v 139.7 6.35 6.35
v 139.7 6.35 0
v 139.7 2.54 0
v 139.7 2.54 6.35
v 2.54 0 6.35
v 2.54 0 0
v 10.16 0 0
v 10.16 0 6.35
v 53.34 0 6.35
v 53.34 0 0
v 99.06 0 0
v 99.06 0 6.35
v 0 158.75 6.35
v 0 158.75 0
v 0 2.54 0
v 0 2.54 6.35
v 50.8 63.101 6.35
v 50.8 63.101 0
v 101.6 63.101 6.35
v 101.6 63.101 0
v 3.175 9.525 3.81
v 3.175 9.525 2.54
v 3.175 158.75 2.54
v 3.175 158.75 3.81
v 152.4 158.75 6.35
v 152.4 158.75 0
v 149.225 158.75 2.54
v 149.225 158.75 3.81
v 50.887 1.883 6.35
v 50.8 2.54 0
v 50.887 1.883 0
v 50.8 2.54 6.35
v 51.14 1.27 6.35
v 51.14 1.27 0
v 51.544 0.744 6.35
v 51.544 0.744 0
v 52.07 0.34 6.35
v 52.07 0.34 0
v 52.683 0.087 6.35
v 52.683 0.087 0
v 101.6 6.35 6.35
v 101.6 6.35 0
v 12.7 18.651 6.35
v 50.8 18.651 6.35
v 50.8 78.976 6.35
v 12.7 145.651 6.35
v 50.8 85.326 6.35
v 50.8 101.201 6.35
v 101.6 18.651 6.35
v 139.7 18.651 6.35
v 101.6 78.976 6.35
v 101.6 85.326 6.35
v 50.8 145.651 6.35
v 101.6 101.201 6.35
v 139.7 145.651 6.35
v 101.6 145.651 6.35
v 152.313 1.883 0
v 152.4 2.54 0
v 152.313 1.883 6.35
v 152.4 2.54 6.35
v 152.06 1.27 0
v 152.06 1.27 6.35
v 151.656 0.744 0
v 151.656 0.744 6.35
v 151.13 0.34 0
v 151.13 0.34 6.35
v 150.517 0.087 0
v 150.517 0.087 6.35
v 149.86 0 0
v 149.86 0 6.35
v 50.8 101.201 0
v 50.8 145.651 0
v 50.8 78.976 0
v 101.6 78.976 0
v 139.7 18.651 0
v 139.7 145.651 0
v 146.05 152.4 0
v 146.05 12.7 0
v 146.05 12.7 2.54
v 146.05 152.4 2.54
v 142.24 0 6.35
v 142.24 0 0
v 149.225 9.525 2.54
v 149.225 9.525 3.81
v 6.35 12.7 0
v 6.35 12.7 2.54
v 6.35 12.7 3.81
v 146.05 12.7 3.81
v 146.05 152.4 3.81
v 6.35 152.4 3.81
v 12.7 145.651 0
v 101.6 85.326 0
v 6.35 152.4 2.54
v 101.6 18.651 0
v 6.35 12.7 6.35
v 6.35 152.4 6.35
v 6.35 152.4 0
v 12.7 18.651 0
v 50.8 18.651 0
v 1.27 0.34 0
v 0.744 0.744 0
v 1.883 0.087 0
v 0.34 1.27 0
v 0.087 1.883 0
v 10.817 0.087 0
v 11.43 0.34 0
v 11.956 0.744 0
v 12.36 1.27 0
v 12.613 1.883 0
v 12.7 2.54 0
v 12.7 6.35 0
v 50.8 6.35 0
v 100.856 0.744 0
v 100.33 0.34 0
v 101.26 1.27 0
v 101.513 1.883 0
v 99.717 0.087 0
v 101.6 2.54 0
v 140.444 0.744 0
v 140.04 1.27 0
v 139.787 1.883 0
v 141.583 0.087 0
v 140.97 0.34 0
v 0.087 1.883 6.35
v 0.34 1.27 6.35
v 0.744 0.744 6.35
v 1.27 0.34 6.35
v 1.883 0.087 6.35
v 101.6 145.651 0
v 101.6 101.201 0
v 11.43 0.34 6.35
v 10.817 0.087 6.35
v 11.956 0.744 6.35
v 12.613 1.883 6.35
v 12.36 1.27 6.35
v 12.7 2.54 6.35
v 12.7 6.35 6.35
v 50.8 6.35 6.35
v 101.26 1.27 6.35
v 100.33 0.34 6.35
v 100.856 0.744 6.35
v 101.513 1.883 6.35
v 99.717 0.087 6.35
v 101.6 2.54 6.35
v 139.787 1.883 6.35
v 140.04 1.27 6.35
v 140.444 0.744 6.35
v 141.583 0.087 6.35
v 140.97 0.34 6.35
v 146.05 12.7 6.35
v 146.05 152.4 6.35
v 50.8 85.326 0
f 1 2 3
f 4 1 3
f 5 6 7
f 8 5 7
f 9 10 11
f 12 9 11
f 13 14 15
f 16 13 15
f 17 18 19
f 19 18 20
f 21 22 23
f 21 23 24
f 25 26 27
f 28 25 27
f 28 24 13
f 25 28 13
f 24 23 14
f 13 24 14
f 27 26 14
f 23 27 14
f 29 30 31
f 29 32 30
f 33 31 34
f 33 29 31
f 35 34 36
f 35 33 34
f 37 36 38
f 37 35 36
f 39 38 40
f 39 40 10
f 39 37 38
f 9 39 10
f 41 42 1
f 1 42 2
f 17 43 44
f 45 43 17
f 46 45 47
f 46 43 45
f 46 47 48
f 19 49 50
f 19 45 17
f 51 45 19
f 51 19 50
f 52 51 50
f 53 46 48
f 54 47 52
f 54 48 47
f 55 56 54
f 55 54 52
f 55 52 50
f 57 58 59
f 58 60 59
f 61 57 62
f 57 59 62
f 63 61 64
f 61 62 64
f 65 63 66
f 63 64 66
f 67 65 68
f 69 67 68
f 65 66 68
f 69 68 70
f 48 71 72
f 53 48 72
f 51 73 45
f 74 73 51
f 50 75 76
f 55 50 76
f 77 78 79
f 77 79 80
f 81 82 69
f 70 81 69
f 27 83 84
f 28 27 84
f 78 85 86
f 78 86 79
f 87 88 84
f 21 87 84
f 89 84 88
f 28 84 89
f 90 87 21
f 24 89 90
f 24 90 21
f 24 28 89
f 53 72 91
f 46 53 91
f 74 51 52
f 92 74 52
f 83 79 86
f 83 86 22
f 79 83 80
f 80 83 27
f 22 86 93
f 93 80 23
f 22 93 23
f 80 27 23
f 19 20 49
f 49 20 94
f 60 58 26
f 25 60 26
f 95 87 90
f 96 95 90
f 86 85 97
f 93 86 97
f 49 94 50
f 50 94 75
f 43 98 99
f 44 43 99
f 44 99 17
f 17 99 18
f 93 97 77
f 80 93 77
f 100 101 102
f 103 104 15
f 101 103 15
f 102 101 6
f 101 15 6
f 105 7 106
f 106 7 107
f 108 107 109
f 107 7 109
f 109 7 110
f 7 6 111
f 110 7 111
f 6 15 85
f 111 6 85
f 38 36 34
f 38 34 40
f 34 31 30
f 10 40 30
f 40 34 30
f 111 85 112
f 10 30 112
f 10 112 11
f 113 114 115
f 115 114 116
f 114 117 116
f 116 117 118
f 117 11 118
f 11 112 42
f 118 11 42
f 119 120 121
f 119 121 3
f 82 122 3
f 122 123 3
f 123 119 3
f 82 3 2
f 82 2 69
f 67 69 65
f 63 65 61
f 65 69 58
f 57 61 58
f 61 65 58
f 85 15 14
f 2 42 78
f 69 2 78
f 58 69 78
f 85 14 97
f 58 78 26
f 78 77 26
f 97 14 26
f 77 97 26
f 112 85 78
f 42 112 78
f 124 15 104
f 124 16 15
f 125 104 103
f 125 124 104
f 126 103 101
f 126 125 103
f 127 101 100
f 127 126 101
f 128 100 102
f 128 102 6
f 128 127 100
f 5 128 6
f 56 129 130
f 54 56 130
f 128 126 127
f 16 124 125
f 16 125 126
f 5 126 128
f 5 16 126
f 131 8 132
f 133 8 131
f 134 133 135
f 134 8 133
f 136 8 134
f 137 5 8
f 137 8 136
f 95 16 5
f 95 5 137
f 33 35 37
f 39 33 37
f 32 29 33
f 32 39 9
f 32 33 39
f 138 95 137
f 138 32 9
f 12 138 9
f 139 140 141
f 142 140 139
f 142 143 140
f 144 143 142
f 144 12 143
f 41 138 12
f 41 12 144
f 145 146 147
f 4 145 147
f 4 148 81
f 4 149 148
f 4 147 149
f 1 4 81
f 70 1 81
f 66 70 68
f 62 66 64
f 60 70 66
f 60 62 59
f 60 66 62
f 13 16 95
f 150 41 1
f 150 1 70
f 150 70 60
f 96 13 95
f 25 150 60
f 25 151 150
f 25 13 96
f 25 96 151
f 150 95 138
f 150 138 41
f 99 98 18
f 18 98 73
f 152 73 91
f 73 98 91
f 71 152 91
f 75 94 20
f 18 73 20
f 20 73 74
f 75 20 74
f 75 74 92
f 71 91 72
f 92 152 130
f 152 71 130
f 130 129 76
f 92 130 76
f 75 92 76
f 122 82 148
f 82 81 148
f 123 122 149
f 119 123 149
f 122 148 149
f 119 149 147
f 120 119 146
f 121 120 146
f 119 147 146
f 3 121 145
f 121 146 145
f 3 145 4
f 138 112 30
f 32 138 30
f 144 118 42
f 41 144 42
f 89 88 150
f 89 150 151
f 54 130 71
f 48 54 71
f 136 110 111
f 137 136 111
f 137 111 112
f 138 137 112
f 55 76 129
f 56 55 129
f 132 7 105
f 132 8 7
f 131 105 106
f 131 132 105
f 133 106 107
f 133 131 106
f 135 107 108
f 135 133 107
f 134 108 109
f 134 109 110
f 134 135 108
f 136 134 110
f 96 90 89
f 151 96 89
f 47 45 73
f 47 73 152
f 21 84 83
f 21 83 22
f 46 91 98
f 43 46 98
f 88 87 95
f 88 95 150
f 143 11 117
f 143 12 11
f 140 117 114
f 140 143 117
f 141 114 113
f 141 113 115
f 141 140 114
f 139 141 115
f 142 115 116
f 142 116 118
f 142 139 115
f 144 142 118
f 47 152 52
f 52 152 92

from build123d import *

# Parameters (mm, degrees)
F0_W     = 139.7
F0_H     = 139.7
F1_DEPTH = 6.35
F0_W_2   = 50.8
F0_H_2   = 6.35
F2_W     = 146.05
F2_H     = 1.27
F3_DEPTH = 149.225
F4_R     = 2.54


with BuildPart() as f1:
    # F0 (on Top) → F1 (new body)
    with BuildSketch(Plane.XY):
        Polygon((0, 158.75), (0, 0), (12.7, 0), (12.7, 6.35), (50.8, 6.35), (50.8, 0), (101.6, 0), (101.6, 6.35), (139.7, 6.35), (139.7, 0), (152.4, 0), (152.4, 158.75), align=None)
        with Locations((76.2, 82.55)):
            Rectangle(F0_W, F0_H, mode=Mode.SUBTRACT)
    extrude(amount=F1_DEPTH)

    # F2 (on face) → F3 (cut)
    with BuildSketch(Plane(origin=(0, 158.75, 0), x_dir=(-1, 0, 0), z_dir=(0, 1, 0))):
        with Locations((-76.2, 3.175)):
            Rectangle(F2_W, F2_H)
    extrude(amount=-F3_DEPTH, mode=Mode.SUBTRACT)

    # F4
    f4_edges = [f1.edges().sort_by_distance(p)[0] for p in [
        (12.7, 0, 3.175),
        (0, 0, 3.175),
        (50.8, 0, 3.175),
        (101.6, 0, 3.175),
        (139.7, 0, 3.175),
        (152.4, 0, 3.175),
    ]]
    fillet(f4_edges, radius=F4_R)


with BuildPart() as f1b:
    # F0 (on Top) → F1, piece 2 (new body)
    with BuildSketch(Plane.XY):
        Polygon((50.8, 145.6505734556), (12.7, 145.6505734556), (12.7, 18.6505734556), (50.8, 18.6505734556), (50.8, 63.1005734556), (101.6, 63.1005734556), (101.6, 18.6505734556), (139.7, 18.6505734556), (139.7, 145.6505734556), (101.6, 145.6505734556), (101.6, 101.2005734556), (50.8, 101.2005734556), align=None)
        with Locations((76.2, 82.1505734556)):
            Rectangle(F0_W_2, F0_H_2, mode=Mode.SUBTRACT)
    extrude(amount=F1_DEPTH)


solid = Compound([f1.part, f1b.part])
